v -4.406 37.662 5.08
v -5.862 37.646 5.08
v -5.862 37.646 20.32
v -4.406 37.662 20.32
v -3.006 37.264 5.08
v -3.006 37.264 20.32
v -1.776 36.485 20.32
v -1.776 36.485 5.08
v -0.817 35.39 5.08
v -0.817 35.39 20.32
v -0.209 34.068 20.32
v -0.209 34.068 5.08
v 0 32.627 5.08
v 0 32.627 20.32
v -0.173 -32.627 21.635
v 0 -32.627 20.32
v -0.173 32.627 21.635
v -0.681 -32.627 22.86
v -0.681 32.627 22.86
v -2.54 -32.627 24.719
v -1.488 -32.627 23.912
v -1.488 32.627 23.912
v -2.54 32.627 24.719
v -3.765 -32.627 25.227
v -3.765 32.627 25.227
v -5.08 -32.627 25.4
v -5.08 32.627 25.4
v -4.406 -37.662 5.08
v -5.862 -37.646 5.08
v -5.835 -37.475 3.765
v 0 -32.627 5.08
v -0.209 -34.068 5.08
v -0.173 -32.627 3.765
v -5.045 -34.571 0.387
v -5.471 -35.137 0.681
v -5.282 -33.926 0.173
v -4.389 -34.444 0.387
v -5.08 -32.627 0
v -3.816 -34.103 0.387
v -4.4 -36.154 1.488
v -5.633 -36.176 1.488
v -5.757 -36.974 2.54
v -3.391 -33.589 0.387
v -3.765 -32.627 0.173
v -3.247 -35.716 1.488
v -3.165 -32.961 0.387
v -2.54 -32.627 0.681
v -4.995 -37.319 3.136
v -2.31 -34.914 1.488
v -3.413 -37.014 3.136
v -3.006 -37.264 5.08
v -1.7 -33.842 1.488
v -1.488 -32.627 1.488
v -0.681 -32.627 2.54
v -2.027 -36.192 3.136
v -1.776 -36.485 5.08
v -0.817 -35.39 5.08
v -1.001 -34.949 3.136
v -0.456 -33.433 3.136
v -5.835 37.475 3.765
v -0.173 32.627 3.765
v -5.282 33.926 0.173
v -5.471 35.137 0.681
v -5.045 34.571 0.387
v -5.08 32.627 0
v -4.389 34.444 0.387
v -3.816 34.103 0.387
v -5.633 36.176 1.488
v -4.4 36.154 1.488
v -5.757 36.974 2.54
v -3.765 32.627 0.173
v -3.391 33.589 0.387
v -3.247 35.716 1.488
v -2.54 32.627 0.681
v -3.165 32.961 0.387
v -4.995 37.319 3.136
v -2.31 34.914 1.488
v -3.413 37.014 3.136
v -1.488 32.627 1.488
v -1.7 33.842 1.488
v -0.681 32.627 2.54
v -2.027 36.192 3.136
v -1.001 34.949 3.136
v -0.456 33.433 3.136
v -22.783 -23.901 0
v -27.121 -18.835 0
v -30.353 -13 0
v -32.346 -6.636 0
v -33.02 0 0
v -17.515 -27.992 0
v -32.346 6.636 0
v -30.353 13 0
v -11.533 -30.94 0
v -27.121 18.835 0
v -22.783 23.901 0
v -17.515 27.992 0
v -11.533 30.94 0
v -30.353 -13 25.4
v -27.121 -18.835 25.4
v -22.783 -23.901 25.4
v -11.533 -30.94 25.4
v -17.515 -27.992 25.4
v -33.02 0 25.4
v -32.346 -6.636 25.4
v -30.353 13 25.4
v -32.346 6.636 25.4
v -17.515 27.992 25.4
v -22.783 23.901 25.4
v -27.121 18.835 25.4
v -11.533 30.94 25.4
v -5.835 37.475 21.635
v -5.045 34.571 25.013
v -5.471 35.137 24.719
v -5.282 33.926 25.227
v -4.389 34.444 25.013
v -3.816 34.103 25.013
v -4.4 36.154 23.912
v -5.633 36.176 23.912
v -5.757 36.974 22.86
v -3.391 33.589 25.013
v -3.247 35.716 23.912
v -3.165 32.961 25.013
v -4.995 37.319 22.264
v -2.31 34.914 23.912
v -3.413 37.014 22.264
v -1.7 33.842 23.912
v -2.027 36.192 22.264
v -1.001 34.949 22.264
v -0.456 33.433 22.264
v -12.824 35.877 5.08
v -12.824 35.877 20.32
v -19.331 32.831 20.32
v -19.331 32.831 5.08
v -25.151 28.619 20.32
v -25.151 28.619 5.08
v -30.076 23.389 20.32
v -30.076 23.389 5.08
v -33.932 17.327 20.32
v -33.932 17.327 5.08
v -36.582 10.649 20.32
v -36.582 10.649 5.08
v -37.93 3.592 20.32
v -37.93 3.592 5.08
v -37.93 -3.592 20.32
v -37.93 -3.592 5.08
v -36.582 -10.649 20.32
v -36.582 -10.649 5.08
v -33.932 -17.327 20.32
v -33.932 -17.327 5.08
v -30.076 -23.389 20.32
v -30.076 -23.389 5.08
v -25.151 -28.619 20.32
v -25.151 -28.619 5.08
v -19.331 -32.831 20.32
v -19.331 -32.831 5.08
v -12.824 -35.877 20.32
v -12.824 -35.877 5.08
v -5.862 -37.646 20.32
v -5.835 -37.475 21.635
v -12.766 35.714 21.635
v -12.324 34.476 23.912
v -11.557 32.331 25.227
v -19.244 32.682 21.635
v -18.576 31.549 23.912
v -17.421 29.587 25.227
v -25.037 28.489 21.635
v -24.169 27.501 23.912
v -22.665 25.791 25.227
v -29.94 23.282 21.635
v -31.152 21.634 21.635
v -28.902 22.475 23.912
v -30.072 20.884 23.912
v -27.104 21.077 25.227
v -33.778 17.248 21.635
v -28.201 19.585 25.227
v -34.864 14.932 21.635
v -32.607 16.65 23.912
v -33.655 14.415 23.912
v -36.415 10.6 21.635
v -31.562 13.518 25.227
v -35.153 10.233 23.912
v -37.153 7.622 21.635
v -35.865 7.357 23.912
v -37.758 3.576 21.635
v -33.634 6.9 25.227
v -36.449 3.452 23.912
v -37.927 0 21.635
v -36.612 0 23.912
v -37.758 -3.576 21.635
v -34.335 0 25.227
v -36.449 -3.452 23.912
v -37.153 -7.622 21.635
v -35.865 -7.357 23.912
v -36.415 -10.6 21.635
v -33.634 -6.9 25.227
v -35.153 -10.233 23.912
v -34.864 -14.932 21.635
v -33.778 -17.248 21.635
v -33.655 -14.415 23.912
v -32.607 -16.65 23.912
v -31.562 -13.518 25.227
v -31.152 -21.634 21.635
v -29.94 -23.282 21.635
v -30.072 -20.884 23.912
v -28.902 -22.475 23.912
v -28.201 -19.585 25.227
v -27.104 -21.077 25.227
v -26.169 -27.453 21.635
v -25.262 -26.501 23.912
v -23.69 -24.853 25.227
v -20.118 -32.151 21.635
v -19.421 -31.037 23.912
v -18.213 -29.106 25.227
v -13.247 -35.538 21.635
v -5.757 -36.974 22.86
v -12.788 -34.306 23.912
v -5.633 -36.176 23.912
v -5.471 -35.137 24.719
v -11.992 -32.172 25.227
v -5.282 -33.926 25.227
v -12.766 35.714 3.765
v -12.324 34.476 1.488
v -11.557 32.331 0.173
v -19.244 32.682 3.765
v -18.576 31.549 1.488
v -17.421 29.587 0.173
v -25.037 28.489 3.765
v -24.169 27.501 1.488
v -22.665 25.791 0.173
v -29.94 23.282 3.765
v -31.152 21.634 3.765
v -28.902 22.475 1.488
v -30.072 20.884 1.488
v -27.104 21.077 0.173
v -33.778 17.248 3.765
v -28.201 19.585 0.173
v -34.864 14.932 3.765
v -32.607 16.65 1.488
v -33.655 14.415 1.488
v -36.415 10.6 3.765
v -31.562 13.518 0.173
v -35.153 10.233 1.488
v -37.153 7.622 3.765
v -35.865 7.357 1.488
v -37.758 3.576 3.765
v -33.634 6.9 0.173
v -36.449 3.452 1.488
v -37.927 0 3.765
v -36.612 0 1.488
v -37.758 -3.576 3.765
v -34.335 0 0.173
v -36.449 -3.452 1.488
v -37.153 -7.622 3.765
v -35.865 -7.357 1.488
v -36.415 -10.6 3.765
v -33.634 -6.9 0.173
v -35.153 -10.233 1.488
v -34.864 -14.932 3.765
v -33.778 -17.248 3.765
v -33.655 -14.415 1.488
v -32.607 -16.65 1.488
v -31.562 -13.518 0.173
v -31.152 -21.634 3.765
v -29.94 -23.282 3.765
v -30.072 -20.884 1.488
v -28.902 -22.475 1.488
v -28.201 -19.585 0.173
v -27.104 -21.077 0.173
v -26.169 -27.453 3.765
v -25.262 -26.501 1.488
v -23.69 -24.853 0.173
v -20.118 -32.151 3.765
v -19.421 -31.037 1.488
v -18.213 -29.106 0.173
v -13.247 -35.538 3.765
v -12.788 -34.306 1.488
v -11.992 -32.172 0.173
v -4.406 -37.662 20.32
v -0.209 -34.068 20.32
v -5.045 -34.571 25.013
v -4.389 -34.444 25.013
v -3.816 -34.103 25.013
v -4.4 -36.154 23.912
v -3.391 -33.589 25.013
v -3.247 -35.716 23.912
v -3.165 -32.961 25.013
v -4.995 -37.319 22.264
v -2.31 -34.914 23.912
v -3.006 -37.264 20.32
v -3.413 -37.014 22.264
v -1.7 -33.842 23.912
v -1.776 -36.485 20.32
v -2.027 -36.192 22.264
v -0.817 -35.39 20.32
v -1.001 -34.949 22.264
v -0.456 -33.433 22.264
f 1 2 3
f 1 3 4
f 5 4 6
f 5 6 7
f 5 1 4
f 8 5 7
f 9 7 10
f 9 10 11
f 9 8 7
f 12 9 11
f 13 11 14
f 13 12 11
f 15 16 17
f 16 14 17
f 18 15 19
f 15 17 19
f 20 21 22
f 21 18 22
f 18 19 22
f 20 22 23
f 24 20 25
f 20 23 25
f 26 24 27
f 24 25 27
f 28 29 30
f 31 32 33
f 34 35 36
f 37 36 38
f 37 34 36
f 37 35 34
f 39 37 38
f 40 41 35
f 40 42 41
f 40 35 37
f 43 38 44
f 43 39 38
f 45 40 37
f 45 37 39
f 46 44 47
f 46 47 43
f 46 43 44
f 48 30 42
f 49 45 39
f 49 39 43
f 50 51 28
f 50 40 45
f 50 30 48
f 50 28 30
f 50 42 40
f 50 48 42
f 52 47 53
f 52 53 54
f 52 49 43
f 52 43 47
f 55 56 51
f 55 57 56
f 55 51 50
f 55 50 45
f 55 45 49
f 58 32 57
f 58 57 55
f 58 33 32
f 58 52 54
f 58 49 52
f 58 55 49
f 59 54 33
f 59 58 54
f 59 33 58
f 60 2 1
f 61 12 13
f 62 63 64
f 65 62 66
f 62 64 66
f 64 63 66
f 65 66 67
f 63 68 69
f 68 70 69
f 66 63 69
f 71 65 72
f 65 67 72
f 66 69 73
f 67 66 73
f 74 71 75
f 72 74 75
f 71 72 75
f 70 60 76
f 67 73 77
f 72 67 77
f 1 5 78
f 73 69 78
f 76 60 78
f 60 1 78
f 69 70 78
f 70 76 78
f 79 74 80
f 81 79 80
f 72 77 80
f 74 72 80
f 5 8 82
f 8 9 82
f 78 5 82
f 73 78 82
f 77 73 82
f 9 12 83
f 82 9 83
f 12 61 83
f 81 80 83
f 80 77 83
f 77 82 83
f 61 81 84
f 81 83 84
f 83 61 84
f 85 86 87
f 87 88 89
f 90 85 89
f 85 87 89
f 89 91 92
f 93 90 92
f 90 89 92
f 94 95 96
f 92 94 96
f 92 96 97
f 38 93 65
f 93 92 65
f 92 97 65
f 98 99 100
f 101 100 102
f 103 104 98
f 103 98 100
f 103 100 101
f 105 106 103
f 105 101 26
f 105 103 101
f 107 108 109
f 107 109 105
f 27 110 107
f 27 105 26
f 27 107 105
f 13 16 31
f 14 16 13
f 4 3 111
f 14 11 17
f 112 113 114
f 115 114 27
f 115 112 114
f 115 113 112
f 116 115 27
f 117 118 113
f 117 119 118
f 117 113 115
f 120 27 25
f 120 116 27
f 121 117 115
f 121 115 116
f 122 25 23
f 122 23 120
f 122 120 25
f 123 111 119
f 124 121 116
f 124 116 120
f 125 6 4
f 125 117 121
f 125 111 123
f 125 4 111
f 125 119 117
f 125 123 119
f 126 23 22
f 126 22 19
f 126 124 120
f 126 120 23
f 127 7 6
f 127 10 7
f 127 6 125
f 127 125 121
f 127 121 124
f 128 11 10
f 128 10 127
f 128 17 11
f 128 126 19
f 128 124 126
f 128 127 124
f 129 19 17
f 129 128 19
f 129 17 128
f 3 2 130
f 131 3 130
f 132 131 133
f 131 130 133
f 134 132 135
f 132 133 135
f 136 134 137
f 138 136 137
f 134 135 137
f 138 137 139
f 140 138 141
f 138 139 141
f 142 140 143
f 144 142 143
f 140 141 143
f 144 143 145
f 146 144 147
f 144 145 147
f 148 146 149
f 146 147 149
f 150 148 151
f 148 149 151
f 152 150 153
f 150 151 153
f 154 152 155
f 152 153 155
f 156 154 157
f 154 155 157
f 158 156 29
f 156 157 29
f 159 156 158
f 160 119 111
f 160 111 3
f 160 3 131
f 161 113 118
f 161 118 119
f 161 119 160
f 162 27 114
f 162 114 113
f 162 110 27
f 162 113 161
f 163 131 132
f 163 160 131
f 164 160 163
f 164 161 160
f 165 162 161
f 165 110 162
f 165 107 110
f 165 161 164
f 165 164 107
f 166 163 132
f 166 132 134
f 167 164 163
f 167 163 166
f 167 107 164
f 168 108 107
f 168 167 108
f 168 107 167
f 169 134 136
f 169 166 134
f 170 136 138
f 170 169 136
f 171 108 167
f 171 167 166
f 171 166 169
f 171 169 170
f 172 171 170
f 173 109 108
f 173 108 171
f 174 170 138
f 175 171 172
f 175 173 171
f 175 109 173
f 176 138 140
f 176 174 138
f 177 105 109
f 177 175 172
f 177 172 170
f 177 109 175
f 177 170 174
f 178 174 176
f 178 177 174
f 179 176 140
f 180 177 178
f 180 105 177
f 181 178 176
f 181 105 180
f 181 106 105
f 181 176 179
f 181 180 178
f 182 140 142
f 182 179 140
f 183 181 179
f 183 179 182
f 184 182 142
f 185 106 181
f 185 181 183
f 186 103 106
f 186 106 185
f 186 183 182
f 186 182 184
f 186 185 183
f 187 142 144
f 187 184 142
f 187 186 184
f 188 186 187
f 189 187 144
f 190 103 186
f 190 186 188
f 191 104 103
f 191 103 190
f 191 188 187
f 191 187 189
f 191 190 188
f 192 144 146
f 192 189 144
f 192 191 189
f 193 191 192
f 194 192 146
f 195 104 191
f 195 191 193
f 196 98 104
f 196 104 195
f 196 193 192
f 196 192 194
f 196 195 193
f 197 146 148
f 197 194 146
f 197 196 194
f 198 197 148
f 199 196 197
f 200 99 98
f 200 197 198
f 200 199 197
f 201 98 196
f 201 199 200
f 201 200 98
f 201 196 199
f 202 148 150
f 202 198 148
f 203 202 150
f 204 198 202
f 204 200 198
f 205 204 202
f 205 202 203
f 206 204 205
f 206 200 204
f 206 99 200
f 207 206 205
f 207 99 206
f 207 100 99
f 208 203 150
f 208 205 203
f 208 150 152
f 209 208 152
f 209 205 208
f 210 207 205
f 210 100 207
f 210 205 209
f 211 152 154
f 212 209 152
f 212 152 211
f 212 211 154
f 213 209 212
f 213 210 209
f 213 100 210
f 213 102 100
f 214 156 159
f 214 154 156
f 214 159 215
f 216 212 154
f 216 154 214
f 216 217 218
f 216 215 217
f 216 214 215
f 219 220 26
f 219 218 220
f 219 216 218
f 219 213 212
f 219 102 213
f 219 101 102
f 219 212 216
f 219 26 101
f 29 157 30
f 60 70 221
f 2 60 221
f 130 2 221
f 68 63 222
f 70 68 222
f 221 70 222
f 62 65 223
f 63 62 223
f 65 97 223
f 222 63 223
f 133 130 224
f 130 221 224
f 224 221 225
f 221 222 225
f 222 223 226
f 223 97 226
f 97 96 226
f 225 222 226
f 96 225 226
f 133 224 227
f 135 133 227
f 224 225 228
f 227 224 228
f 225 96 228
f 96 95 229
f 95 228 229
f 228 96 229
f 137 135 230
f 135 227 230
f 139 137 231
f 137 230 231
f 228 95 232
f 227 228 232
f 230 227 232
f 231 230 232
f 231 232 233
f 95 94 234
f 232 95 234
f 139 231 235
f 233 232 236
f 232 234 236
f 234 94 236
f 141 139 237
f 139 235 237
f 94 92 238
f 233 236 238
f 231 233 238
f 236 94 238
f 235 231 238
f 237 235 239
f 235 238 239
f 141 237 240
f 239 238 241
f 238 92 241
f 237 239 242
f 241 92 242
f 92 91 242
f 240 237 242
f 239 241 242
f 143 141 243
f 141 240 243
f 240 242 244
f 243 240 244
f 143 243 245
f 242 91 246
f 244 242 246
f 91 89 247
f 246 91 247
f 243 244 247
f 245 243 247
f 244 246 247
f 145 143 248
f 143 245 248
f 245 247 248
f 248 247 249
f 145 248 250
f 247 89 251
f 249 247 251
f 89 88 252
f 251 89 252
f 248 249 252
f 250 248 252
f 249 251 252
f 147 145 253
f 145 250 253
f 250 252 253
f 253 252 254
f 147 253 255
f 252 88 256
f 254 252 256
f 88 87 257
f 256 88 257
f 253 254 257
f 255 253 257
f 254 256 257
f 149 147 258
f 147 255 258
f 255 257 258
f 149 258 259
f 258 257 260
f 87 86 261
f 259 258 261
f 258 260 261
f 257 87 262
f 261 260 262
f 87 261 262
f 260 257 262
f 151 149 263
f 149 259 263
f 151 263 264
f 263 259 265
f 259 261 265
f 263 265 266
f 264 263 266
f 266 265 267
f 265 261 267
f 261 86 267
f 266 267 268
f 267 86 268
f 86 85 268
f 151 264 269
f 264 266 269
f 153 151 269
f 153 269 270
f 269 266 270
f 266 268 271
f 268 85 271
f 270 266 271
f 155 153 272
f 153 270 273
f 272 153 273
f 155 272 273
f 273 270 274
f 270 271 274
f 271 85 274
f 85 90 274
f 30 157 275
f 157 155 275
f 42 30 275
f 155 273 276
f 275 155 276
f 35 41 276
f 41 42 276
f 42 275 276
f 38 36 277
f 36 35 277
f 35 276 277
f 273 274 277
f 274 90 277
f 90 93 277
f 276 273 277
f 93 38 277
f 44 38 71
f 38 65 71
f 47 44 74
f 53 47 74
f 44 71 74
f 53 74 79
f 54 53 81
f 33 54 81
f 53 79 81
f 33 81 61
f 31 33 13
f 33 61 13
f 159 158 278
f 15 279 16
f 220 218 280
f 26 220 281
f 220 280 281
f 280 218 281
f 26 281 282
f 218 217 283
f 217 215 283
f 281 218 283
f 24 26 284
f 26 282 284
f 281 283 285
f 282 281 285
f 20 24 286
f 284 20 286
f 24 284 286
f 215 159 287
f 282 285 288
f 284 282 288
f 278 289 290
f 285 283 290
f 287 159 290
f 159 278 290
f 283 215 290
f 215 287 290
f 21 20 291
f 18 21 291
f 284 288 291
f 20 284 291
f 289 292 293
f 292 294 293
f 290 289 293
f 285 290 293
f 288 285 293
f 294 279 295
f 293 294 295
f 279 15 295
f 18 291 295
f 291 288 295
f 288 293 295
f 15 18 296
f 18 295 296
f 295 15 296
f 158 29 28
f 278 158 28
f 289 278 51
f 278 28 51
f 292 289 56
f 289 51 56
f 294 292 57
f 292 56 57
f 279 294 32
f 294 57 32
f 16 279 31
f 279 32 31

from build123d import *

# Parameters (mm, degrees)
F0_R     = 38.1
F1_DEPTH = 25.4
F2_W     = 44.03428
F2_H     = 85.478309
F3_DEPTH = 25.4
F4_R     = 5.08


with BuildPart() as f1:
    # F0 (on Top) → F1 (new body)
    with BuildSketch(Plane.XY):
        Circle(F0_R)
    extrude(amount=F1_DEPTH)

    # F2 (on face) → F3 (cut)
    with BuildSketch(Plane.XY.offset(25.4)):
        with Locations((22.01714, -1.870739)):
            Rectangle(F2_W, F2_H)
    extrude(amount=-F3_DEPTH, mode=Mode.SUBTRACT)

    # F4
    f4_edges = [f1.edges().sort_by_distance(p)[0] for p in [
        (0, 0, 25.4),
        (0, -38.1, 12.7),
        (0, 38.1, 12.7),
        (-38.1, 0, 25.4),
        (-38.1, 0, 0),
        (0, 0, 0),
    ]]
    fillet(f4_edges, radius=F4_R)


solid = f1.part
